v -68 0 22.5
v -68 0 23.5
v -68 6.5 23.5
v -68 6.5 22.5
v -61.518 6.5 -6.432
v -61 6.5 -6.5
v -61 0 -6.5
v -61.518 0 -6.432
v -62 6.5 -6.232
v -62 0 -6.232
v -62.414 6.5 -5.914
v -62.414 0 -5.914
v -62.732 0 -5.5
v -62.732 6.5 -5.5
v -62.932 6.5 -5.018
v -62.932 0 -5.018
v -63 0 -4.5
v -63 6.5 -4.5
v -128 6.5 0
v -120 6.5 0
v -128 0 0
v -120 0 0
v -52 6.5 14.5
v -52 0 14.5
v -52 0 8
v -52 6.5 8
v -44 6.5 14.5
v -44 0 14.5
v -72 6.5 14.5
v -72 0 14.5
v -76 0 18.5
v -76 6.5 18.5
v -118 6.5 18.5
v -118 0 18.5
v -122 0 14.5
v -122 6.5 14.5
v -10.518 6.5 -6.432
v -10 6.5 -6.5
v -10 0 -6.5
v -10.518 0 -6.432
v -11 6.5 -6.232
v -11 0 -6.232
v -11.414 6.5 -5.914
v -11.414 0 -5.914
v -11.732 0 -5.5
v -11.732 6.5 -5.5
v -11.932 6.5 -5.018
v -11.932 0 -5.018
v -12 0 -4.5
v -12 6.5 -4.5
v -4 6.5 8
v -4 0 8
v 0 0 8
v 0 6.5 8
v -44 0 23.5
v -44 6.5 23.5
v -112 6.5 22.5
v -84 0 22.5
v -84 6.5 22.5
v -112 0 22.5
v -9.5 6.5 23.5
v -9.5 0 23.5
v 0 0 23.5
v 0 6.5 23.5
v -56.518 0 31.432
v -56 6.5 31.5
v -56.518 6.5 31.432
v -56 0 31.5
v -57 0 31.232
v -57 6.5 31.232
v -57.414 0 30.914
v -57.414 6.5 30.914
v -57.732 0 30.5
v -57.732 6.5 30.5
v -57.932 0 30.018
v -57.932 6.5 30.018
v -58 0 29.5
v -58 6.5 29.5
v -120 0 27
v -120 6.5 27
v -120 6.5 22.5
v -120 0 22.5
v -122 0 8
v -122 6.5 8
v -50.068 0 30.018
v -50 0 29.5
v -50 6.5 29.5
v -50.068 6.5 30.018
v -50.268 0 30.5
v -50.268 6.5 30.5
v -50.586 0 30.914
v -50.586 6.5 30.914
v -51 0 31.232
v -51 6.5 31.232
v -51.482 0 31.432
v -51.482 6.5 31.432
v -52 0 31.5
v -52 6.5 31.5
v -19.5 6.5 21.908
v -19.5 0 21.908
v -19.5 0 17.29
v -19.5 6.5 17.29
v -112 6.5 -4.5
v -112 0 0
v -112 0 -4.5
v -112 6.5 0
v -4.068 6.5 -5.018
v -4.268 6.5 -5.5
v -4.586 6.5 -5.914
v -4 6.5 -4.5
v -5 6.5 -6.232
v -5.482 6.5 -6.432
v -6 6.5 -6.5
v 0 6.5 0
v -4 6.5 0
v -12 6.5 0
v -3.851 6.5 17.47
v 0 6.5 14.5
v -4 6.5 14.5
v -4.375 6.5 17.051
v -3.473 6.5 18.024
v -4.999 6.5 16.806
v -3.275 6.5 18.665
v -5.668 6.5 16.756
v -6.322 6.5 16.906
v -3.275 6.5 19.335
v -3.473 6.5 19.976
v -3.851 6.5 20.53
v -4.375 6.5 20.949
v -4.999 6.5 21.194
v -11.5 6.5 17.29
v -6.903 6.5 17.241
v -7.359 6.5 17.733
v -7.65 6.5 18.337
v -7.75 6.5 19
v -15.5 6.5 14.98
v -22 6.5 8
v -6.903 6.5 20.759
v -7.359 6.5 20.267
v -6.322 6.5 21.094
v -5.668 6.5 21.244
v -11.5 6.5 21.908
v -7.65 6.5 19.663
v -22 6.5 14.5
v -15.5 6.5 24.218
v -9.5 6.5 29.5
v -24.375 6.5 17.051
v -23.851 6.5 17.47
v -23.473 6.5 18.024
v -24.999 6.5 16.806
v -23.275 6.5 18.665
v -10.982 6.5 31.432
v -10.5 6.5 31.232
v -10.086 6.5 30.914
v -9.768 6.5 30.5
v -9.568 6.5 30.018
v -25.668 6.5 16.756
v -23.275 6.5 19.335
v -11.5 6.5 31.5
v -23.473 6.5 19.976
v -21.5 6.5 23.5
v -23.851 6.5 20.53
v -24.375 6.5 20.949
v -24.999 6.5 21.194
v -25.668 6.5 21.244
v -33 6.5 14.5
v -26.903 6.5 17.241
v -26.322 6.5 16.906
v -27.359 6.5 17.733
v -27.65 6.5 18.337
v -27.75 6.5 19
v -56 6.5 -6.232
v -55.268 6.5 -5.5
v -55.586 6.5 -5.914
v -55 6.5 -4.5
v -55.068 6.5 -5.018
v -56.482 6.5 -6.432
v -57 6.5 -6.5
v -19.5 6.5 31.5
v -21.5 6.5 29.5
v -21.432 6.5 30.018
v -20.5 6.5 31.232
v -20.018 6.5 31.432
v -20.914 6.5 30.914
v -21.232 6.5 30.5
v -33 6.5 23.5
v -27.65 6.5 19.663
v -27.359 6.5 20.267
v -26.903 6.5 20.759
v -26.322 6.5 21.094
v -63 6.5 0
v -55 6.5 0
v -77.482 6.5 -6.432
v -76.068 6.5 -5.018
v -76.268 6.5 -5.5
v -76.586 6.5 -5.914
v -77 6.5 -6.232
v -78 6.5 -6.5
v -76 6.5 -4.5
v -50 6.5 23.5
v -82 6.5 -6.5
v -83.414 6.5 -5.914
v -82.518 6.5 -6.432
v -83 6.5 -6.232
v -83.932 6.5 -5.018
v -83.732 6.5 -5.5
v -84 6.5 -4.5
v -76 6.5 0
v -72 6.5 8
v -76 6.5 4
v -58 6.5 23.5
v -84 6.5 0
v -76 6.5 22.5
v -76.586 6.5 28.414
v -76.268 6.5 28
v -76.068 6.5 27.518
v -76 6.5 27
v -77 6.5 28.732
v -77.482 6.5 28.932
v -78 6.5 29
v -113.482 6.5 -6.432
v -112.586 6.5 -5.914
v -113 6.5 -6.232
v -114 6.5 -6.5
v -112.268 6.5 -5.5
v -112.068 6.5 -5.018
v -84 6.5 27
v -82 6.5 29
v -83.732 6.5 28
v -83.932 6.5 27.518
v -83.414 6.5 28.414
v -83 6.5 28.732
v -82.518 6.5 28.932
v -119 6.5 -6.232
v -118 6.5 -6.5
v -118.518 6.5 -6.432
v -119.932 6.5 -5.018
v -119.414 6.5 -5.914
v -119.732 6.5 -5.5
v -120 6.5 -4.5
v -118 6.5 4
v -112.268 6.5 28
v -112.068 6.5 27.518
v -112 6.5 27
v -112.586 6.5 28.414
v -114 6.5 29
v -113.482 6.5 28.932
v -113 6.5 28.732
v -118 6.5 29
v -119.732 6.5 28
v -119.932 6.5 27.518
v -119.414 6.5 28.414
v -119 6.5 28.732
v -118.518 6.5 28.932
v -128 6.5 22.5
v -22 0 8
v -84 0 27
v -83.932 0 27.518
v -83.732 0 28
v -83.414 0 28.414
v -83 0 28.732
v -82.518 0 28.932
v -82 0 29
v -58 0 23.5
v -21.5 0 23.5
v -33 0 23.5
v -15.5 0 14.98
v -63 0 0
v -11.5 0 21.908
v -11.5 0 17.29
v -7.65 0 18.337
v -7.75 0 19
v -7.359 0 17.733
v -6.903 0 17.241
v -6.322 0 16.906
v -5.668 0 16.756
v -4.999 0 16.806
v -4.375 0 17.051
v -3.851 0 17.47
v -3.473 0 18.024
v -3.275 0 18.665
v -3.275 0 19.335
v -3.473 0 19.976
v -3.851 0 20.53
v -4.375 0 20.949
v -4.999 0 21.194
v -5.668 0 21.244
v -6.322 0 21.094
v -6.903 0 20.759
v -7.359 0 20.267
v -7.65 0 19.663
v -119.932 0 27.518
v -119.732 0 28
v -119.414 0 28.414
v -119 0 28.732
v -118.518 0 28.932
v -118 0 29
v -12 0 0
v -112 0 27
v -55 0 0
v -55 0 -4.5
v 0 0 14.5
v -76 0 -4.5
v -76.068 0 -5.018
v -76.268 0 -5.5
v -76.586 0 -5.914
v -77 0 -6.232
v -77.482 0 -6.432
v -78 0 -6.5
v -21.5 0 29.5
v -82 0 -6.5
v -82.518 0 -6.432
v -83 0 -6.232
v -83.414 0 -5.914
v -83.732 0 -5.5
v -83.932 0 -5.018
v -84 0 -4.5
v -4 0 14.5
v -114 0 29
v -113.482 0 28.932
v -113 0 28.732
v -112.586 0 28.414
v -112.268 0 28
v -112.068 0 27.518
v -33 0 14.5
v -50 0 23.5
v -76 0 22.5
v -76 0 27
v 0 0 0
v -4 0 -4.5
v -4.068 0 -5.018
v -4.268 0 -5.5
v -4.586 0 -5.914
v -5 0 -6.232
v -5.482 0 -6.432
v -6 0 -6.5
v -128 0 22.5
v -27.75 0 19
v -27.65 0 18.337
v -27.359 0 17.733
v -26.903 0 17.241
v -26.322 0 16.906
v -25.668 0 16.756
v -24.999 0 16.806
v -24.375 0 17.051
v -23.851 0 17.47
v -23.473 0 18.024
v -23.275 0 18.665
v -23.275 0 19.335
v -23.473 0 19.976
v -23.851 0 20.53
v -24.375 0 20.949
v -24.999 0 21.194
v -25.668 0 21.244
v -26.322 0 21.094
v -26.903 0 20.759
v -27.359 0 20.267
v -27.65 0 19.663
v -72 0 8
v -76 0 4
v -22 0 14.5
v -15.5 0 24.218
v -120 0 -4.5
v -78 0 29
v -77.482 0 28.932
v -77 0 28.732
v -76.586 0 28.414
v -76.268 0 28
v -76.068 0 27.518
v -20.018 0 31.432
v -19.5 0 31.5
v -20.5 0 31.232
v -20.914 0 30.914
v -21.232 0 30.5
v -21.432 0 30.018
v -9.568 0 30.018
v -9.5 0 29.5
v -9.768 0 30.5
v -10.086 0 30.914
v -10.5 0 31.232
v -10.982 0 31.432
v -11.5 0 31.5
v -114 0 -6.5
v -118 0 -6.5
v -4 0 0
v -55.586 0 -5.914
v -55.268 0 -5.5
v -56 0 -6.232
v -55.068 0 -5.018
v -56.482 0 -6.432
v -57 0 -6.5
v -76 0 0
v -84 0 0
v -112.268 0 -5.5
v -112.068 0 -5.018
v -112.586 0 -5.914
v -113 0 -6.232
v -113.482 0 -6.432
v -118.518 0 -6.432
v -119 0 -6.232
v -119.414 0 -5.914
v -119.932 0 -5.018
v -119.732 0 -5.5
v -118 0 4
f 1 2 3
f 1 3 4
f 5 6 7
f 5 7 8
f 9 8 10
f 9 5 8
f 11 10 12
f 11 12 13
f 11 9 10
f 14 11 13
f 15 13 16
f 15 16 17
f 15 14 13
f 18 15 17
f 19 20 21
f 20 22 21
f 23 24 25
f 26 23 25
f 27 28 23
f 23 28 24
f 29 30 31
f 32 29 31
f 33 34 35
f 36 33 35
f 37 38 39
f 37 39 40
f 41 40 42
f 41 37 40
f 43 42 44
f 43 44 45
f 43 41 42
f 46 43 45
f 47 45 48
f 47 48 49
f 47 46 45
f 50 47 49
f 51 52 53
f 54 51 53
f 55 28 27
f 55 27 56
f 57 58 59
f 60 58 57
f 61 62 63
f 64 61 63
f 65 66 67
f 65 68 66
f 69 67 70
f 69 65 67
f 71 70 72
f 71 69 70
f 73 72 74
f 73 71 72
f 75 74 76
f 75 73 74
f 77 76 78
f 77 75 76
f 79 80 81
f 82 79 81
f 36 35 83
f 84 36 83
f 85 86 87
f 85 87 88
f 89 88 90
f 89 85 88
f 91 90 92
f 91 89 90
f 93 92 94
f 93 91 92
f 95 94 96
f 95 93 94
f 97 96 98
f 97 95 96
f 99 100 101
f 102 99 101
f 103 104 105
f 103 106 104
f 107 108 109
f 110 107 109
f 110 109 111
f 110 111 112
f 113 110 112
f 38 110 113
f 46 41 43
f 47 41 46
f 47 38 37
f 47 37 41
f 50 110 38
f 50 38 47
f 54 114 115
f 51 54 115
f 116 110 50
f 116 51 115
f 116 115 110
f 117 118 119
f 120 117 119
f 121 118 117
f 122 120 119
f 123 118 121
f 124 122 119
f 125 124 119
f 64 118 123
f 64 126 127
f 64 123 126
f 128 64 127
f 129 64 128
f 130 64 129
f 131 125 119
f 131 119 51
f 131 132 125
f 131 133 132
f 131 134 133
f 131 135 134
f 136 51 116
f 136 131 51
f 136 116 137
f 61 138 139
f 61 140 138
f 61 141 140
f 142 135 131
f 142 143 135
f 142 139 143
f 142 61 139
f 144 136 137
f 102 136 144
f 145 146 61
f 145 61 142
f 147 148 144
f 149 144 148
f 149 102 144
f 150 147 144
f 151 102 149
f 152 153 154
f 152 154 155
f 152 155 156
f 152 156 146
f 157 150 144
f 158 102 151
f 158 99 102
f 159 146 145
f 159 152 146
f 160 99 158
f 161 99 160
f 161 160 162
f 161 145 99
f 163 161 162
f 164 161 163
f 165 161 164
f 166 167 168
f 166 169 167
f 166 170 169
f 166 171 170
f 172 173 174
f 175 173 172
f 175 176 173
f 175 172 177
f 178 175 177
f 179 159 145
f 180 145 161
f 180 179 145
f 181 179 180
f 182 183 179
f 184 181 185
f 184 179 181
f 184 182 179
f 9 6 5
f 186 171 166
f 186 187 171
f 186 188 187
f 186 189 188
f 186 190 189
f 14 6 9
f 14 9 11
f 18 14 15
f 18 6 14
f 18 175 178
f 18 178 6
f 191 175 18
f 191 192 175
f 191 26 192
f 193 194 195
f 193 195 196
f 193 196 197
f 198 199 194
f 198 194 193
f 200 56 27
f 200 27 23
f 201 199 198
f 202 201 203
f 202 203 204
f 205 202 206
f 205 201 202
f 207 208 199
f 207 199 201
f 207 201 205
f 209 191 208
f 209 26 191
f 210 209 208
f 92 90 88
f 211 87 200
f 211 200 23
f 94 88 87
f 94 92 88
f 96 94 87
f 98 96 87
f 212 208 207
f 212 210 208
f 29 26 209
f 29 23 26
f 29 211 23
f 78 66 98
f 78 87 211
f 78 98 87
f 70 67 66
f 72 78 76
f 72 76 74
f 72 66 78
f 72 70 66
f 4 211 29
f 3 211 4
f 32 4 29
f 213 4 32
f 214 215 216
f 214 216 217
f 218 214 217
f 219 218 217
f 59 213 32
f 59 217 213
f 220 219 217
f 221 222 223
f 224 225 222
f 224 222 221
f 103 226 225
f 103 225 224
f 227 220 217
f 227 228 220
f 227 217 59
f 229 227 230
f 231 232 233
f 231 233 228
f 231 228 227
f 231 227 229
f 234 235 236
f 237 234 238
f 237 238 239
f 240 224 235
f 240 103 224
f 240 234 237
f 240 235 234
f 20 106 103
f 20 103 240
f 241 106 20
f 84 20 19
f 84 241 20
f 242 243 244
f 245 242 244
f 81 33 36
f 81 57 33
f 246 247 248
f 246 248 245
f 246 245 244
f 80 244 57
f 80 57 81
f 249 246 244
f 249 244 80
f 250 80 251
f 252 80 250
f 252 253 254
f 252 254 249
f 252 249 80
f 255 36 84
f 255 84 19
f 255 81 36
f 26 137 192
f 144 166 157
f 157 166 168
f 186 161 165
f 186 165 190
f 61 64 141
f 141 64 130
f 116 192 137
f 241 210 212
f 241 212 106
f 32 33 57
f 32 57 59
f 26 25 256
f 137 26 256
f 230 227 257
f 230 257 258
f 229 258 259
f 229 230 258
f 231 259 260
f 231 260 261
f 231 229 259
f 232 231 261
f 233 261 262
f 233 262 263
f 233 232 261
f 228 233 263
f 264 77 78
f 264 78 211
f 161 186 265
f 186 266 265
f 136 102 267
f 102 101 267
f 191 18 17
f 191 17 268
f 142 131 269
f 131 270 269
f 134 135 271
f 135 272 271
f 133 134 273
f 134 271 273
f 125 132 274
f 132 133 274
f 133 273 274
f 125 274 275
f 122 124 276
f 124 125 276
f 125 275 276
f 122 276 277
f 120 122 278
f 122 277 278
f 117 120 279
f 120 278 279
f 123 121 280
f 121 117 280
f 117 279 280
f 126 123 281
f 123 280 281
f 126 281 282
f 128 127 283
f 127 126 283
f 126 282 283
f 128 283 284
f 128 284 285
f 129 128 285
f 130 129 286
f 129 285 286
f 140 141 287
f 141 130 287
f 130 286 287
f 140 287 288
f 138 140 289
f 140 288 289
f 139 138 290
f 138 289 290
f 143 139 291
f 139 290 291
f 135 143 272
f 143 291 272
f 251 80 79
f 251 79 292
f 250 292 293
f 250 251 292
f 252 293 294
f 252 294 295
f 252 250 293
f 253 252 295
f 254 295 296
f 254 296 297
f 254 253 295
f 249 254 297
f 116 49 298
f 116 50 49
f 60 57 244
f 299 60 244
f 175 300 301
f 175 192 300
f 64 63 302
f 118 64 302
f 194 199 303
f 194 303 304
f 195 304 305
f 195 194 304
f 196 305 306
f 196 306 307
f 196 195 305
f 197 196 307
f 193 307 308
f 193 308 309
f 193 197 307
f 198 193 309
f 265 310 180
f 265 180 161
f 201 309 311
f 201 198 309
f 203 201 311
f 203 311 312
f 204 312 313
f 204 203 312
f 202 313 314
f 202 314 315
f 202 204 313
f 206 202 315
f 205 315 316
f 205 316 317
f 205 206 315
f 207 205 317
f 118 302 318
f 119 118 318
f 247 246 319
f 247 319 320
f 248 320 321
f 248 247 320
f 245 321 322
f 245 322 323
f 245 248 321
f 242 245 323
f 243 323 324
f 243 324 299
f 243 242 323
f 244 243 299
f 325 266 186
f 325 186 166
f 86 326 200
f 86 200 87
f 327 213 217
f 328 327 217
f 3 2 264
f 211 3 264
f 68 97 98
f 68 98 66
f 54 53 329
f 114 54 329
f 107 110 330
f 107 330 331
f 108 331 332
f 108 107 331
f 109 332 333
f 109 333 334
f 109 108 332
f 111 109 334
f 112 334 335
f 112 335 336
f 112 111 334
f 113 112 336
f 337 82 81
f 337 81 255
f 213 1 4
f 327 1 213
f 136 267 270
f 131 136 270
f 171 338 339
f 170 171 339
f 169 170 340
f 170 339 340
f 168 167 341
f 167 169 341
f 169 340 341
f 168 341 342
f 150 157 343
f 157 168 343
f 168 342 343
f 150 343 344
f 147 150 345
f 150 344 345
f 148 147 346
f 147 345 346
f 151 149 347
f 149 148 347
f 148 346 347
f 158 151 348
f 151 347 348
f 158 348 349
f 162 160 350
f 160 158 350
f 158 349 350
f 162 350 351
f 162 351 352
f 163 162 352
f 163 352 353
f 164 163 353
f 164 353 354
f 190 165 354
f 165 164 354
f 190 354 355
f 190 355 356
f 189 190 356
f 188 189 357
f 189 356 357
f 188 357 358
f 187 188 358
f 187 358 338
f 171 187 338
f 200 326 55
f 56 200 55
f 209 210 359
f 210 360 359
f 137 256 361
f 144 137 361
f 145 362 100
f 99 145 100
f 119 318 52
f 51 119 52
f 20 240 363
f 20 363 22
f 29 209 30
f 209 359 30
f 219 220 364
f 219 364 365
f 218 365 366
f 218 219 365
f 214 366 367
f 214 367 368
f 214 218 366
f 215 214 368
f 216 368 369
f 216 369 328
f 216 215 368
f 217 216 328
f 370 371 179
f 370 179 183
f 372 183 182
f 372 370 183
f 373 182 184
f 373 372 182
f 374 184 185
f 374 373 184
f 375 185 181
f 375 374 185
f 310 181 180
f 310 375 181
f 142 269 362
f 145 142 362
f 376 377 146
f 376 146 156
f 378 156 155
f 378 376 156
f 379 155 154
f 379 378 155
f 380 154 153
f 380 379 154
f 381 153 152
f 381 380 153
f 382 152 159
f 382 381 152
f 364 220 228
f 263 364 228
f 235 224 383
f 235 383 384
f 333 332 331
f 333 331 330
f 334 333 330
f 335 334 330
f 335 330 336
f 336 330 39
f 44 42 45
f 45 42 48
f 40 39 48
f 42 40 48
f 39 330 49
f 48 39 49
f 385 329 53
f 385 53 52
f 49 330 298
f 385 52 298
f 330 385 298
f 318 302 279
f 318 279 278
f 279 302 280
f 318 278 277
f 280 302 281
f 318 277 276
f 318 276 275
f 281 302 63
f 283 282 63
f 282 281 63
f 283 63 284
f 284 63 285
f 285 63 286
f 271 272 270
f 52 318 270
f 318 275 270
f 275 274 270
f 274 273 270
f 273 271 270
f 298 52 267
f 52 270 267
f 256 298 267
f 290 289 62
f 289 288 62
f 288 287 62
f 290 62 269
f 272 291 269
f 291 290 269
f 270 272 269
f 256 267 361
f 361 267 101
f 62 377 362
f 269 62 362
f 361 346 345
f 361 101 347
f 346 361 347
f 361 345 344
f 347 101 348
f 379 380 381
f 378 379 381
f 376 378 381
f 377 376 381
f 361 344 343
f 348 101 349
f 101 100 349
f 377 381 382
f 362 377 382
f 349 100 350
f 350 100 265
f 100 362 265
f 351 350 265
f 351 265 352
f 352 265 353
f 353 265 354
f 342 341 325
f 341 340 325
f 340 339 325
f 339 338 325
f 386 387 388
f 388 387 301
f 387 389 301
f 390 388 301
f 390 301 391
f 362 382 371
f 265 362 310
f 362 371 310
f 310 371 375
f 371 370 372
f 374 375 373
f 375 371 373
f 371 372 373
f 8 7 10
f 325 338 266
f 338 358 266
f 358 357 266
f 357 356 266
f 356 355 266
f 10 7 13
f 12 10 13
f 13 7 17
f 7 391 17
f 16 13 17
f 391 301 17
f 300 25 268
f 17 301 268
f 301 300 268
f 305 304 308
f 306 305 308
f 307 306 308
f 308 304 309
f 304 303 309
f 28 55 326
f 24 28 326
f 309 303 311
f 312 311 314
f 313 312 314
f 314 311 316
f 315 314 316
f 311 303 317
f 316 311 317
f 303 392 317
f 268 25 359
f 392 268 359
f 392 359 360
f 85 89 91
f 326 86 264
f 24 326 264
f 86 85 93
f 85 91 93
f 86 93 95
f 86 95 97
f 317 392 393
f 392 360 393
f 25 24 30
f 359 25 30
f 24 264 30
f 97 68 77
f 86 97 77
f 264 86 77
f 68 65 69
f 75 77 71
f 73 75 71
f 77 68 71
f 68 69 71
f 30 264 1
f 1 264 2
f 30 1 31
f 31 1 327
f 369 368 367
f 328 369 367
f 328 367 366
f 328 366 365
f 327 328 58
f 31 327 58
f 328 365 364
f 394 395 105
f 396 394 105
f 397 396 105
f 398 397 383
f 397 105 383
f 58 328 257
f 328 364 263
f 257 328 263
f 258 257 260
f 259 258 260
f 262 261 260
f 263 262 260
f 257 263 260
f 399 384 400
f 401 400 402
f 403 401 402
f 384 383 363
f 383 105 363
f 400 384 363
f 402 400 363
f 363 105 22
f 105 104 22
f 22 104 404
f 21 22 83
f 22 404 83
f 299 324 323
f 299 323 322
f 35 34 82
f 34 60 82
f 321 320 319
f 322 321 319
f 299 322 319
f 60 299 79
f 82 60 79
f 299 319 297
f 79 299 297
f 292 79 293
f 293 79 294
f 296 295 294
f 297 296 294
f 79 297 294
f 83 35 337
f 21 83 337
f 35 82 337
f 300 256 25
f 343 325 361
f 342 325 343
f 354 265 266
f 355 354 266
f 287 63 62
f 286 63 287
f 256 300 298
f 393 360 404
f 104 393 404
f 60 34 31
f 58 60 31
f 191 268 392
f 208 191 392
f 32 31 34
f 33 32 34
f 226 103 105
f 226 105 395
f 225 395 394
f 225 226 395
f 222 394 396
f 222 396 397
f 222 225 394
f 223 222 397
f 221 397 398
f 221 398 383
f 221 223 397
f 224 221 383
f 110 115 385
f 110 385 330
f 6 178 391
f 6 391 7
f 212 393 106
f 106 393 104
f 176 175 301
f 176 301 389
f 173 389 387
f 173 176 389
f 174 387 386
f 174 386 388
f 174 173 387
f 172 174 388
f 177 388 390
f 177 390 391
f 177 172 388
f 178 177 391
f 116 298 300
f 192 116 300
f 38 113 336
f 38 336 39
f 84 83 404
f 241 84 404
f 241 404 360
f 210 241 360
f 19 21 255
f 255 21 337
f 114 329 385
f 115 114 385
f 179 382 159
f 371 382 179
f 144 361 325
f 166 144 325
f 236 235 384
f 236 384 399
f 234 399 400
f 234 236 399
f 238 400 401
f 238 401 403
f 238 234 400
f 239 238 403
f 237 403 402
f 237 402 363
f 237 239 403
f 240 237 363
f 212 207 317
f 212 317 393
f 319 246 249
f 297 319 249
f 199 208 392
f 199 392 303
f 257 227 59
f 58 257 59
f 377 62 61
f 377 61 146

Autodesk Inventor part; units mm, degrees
ref_plane "YZ Plane" through (0, 0, 0) normal (1, 0, 0) x (0, 1, 0)
ref_plane "XZ Plane" through (0, 0, 0) normal (0, 1, 0) x (-1, 0, 0)
ref_plane "XY Plane" through (0, 0, 0) normal (0, 0, 1) x (1, 0, 0)
sketch "Sketch1" plane through (0, 0, 0) normal (0, 1, 0) x (-1, 0, 0)
  line L0 (0, 0) -> (128, 0)
  line L1 (128, 0) -> (128, 22.5)
  line L2 (52, 14.5) -> (52, 8)
  line L3 (52, 8) -> (22, 8)
  line L4 (22, 8) -> (22, 14.5)
  circle A0 centre (5.5, 19) radius 2.25
  circle A1 centre (5.5, 19) radius 4.5 construction
  circle A2 centre (25.5, 19) radius 2.25
  circle A3 centre (25.5, 19) radius 4.5 construction
  line L5 (33, 14.5) -> (44, 14.5) construction
  circle A4 centre (38.5, 19.599) radius 7.5 construction
  circle A5 centre (38.5, 19.599) radius 4 construction
  line L6 (33, 23.5) -> (33, 14.5)
  line L7 (44, 14.5) -> (44, 23.5)
  line L8 (22, 14.5) -> (33, 14.5)
  line L9 (44, 14.5) -> (52, 14.5)
  line L10 (0, 14.5) -> (4, 14.5)
  line L11 (4, 14.5) -> (4, 8)
  line L12 (4, 8) -> (0, 8)
  line L13 (0, 23.5) -> (0, 14.5)
  line L14 (0, 8) -> (0, 0)
  line L15 (9.5, 23.5) -> (9.5, 29.5)
  line L16 (11.5, 31.5) -> (19.5, 31.5)
  line L17 (21.5, 29.5) -> (21.5, 23.5)
  arc A6 (11.5, 31.5) -> (9.5, 29.5) centre (11.5, 29.5) ccw
  arc A7 (21.5, 29.5) -> (19.5, 31.5) centre (19.5, 29.5) ccw
  line L18 (33, 23.5) -> (21.5, 23.5)
  line L19 (9.5, 23.5) -> (0, 23.5)
  line L20 (50, 23.5) -> (50, 29.5)
  line L21 (52, 31.5) -> (56, 31.5)
  line L22 (58, 29.5) -> (58, 23.5)
  arc A8 (52, 31.5) -> (50, 29.5) centre (52, 29.5) ccw
  arc A9 (58, 29.5) -> (56, 31.5) centre (56, 29.5) ccw
  line L23 (68, 23.5) -> (58, 23.5)
  line L24 (50, 23.5) -> (44, 23.5)
  line L25 (68, 23.5) -> (68, 22.5)
  line L26 (68, 22.5) -> (128, 22.5)
  line L27 (19.5, 17.2896) -> (15.5, 14.9802)
  line L28 (15.5, 14.9802) -> (11.5, 17.2896)
  line L29 (11.5, 17.2896) -> (11.5, 21.9084)
  line L30 (11.5, 21.9084) -> (15.5, 24.2178)
  line L31 (15.5, 24.2178) -> (19.5, 21.9084)
  line L32 (19.5, 21.9084) -> (19.5, 17.2896)
  point P0 (15.5, 19.599)
  point P1 (0, 19)
  point P2 (15.5, 31.5)
  point P3 (15.5, 19.599)
  dimension "d0" = 6.5
  dimension "d1" = 8
  dimension "d3" = 4.5
  dimension "d4" = 9
  dimension "d5" = 4.5
  dimension "d6" = 9
  dimension "d8" = 11
  dimension "d9" = 8
  dimension "d10" = 15
  dimension "d11" = 9
  dimension "d12" = 4
  dimension "d13" = 5.5
  dimension "d14" = 10
  dimension "d15" = 10
  dimension "d16" = 2
  dimension "d17" = 12
  dimension "d18" = 8
  dimension "d19" = 23
  dimension "d20" = 30
  dimension "d21" = 18
  dimension "d23" = 2
  dimension "d24" = 8
  dimension "d25" = 6
  dimension "d26" = 8
  dimension "d27" = 10
  dimension "d29" = 60
  dimension "d30" = 8
extrude "Extrusion1" add sketch "Sketch1" along normal blind 6.5
sketch "Sketch2" plane through (0, 6.5, 0) normal (0, 1, 0) x (1, 0, 0)
  line L0 (-128, 0) -> (-128, -22.5) projected
  line L1 (-128, -22.5) -> (-68, -22.5) projected
  line L2 (-68, -22.5) -> (-68, -23.5) projected
  line L3 (-120, -22.5) -> (-112, -22.5)
  line L4 (-112, -22.5) -> (-112, -27)
  line L5 (-114, -29) -> (-118, -29)
  line L6 (-120, -27) -> (-120, -22.5)
  line L7 (-84, -22.5) -> (-76, -22.5)
  line L8 (-76, -22.5) -> (-76, -27)
  line L9 (-78, -29) -> (-82, -29)
  line L10 (-84, -27) -> (-84, -22.5)
  arc A0 (-84, -27) -> (-82, -29) centre (-82, -27) ccw
  arc A1 (-78, -29) -> (-76, -27) centre (-78, -27) ccw
  arc A2 (-114, -29) -> (-112, -27) centre (-114, -27) ccw
  arc A3 (-120, -27) -> (-118, -29) centre (-118, -27) ccw
  dimension "d33" = 2
  dimension "d34" = 8
  dimension "d35" = 6.5
  dimension "d36" = 8
  dimension "d37" = 8
  dimension "d38" = 8
extrude "Extrusion2" add sketch "Sketch2" against normal blind 6.5
sketch "Sketch3" plane through (0, 6.5, 0) normal (0, 1, 0) x (1, 0, 0)
  line L0 (0, 0) -> (-128, 0) projected
  line L1 (-112, -27) -> (-112, -22.5) projected
  line L2 (-76, -27) -> (-76, -22.5) projected
  line L3 (0, -8) -> (0, 0) projected
  line L4 (-120, 0) -> (-112, 0)
  line L5 (-112, 0) -> (-112, 4.5)
  line L6 (-114, 6.5) -> (-118, 6.5)
  line L7 (-120, 4.5) -> (-120, 0)
  line L8 (-84, 0) -> (-76, 0)
  line L9 (-76, 0) -> (-76, 4.5)
  line L10 (-78, 6.5) -> (-82, 6.5)
  line L11 (-84, 4.5) -> (-84, 0)
  line L12 (-63, 0) -> (-55, 0)
  line L13 (-55, 0) -> (-55, 4.5)
  line L14 (-57, 6.5) -> (-61, 6.5)
  line L15 (-63, 4.5) -> (-63, 0)
  line L16 (-12, 0) -> (-4, 0)
  line L17 (-4, 0) -> (-4, 4.5)
  line L18 (-6, 6.5) -> (-10, 6.5)
  line L19 (-12, 4.5) -> (-12, 0)
  arc A0 (-118, 6.5) -> (-120, 4.5) centre (-118, 4.5) ccw
  arc A1 (-112, 4.5) -> (-114, 6.5) centre (-114, 4.5) ccw
  arc A2 (-82, 6.5) -> (-84, 4.5) centre (-82, 4.5) ccw
  arc A3 (-76, 4.5) -> (-78, 6.5) centre (-78, 4.5) ccw
  arc A4 (-61, 6.5) -> (-63, 4.5) centre (-61, 4.5) ccw
  arc A5 (-55, 4.5) -> (-57, 6.5) centre (-57, 4.5) ccw
  arc A6 (-10, 6.5) -> (-12, 4.5) centre (-10, 4.5) ccw
  arc A7 (-4, 4.5) -> (-6, 6.5) centre (-6, 4.5) ccw
  dimension "d41" = 2
  dimension "d42" = 6.5
  dimension "d43" = 8
  dimension "d44" = 8
  dimension "d45" = 8
  dimension "d46" = 8
  dimension "d47" = 4
  dimension "d48" = 43
extrude "Extrusion3" add sketch "Sketch3" against normal blind 6.5
sketch "Sketch4" plane through (0, 0, 0) normal (0, -1, 0) x (1, 0, 0)
  line L0 (-112, 22.5) -> (-84, 22.5) projected
  line L1 (-128, 0) -> (-128, 22.5) projected
  line L2 (-84, 0) -> (-112, 0) projected
  line L3 (-63, 0) -> (-76, 0) projected
  line L4 (-4, -4.5) -> (-4, 0) projected
  line L5 (-122, 14.5) -> (-122, 8)
  line L6 (-122, 8) -> (-118, 4)
  line L7 (-118, 4) -> (-76, 4)
  line L8 (-76, 4) -> (-72, 8)
  line L9 (-72, 8) -> (-72, 14.5)
  line L10 (-72, 14.5) -> (-76, 18.5)
  line L11 (-76, 18.5) -> (-118, 18.5)
  line L12 (-118, 18.5) -> (-122, 14.5)
  line L13 (-68, 22.5) -> (-68, 0) construction
  dimension "d52" = 45
  dimension "d53" = 4
  dimension "d54" = 4
  dimension "d55" = 6
  dimension "d56" = 4
  dimension "d57" = 4
extrude "Extrusion4" cut sketch "Sketch4" against normal blind 6.5
properties part number "x_iddler_wall_upper"
